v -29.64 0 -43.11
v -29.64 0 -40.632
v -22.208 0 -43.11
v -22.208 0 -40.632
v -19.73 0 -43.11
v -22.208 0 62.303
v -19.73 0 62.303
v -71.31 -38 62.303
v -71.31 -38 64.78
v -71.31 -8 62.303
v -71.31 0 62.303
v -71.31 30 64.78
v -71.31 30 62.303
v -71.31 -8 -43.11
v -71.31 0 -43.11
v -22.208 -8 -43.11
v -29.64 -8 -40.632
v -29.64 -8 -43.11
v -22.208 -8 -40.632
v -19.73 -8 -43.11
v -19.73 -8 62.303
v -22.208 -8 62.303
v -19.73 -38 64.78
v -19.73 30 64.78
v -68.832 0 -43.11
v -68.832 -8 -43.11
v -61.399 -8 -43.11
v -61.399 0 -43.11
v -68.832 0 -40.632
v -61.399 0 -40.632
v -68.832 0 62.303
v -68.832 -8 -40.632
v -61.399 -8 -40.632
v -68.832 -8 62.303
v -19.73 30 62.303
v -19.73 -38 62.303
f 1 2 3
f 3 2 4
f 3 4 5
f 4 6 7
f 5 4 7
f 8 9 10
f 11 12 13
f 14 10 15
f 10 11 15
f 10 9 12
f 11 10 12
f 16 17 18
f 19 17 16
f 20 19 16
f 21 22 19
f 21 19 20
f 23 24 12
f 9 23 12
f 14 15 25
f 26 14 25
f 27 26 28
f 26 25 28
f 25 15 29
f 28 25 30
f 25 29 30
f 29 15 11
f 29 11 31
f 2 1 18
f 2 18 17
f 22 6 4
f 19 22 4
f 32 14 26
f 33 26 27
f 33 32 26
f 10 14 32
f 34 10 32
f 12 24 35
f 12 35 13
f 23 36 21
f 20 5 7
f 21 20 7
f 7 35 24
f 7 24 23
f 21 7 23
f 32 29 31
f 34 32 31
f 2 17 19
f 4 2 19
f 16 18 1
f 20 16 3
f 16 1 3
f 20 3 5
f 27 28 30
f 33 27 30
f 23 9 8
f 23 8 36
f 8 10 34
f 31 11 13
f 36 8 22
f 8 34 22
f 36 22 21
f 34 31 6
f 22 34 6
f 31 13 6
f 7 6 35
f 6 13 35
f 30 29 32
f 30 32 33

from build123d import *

# Parameters (mm, degrees)
F0_W     = 7.4329227209
F0_H     = 2.4776421487
F0_W_2   = 7.4329264462
F1_DEPTH = 8
F3_DEPTH = 30
F5_DEPTH = 30


with BuildPart() as f1:
    # F0 (on Front) → F1 (new body)
    with BuildSketch(Plane.XZ):
        with Locations((-25.923974812, -41.8709013611)):
            Rectangle(F0_W, F0_H)
        Polygon((-19.7298713028, -43.1097224355), (-19.7298713028, 62.3026564717), (-22.2075134516, 62.3026564717), (-22.2075134516, -40.6320802867), (-22.2075134516, -43.1097224355), align=None)
        Polygon((-19.7298713028, 64.7802948952), (-71.3098570704, 64.7802948952), (-71.3098570704, 62.3026564717), (-68.832218647, 62.3026564717), (-22.2075134516, 62.3026564717), (-19.7298713028, 62.3026564717), align=None)
        Polygon((-68.832218647, 62.3026564717), (-71.3098570704, 62.3026564717), (-71.3098570704, -43.1097224355), (-68.832218647, -43.1097224355), (-68.832218647, -40.6320802867), align=None)
        with Locations((-65.1157554239, -41.8709013611)):
            Rectangle(F0_W_2, F0_H)
    extrude(amount=F1_DEPTH)

    # F2 (on face) → F3 (join)
    with BuildSketch(Plane(origin=(0, 0, 0), x_dir=(-1, 0, 0), z_dir=(0, 1, 0))):
        Polygon((71.3098570704, 64.7802948952), (19.7298713028, 64.7802948952), (19.7298713028, 62.3026564717), (22.2075134516, 62.3026564717), (68.832218647, 62.3026564717), (71.3098570704, 62.3026564717), align=None)
    extrude(amount=F3_DEPTH)

    # F4 (on face) → F5 (join)
    with BuildSketch(Plane.XZ.offset(8)):
        Polygon((-19.7298713028, 64.7802948952), (-71.3098570704, 64.7802948952), (-71.3098570704, 62.3026564717), (-68.832218647, 62.3026564717), (-22.2075134516, 62.3026564717), (-19.7298713028, 62.3026564717), align=None)
    extrude(amount=F5_DEPTH)


solid = f1.part
